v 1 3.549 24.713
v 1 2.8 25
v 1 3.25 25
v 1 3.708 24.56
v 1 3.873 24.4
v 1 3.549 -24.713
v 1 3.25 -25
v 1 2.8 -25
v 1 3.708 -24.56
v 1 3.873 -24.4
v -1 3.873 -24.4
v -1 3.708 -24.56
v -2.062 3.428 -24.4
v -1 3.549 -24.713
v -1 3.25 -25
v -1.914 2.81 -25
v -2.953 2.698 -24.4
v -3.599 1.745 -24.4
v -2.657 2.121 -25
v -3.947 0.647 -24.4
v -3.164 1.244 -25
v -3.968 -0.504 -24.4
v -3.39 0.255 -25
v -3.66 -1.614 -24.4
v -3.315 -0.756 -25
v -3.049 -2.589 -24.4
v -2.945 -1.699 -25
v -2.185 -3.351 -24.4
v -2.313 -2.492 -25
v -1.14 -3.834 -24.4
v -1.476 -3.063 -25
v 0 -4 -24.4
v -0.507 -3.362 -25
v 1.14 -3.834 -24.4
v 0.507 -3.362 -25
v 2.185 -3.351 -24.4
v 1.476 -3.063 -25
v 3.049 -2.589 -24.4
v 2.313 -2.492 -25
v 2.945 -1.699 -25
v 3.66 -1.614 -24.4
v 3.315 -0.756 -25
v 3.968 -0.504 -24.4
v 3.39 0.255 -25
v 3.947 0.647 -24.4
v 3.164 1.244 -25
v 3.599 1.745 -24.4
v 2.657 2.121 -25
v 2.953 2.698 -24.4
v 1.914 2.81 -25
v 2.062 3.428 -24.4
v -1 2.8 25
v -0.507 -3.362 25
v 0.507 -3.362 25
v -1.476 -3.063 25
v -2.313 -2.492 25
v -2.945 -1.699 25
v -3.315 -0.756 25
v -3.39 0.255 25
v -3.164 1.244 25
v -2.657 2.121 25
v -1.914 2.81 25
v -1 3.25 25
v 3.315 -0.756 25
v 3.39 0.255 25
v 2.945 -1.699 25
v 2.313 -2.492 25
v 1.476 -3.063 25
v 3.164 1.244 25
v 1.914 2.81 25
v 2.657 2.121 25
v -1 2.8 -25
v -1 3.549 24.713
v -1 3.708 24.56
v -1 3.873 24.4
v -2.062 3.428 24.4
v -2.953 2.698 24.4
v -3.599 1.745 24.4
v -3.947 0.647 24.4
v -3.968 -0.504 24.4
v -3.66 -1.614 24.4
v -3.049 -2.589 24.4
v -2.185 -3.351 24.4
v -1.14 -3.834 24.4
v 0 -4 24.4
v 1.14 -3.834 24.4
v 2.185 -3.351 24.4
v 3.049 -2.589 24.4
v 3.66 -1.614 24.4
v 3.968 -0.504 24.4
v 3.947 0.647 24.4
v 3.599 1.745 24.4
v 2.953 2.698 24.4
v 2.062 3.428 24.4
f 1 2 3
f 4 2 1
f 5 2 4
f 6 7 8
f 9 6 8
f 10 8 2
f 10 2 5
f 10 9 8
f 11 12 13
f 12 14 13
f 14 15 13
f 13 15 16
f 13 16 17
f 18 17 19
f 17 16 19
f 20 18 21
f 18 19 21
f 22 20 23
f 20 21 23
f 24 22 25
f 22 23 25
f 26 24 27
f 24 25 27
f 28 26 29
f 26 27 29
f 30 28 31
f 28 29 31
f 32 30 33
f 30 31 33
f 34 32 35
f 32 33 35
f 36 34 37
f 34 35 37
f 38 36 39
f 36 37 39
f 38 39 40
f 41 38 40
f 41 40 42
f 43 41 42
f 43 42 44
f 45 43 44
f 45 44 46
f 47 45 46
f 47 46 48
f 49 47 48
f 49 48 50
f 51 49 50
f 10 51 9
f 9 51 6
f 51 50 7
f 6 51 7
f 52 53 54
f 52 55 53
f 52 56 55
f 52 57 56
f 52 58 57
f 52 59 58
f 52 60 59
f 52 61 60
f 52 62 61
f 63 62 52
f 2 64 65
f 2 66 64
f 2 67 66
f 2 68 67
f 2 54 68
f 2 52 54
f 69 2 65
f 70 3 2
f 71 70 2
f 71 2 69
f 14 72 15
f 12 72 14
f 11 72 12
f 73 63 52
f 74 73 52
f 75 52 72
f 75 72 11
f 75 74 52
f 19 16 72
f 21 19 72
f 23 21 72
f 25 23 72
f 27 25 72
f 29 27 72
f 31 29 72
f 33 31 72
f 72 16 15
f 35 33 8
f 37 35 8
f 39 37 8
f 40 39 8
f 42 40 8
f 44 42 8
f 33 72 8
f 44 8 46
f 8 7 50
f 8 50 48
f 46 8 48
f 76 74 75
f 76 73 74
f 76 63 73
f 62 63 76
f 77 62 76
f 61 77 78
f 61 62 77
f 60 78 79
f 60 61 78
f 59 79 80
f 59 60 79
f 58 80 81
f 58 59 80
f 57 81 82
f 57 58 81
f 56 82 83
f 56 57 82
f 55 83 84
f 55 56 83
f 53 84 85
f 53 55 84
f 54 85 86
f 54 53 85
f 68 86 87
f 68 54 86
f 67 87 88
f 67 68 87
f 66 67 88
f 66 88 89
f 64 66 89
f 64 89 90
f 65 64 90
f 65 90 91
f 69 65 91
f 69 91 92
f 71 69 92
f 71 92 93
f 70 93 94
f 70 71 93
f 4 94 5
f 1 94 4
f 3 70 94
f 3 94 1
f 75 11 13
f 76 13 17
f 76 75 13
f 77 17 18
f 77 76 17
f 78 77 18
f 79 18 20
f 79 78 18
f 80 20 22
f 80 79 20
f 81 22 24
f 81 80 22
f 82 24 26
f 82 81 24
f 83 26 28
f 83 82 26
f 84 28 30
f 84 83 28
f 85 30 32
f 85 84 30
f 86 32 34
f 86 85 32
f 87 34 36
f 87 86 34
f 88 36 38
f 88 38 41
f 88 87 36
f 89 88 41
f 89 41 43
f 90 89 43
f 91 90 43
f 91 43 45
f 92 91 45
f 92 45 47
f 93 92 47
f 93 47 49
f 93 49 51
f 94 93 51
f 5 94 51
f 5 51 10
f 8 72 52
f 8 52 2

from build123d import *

# Parameters (mm, degrees)
SKETCH1_R           = 4
EXTRUDE1_DEPTH      = 25
CHAMFER1_SIZE       = 0.6
SKETCH3_W           = 2
SKETCH3_H           = 1.2
EXTRUDE2_DEPTH      = 26
EXTRUDE2_DEPTH_BACK = 26


with BuildPart() as part:
    # Sketch1 → Extrude1 (new body, symmetric)
    with BuildSketch(Plane.XY):
        Circle(SKETCH1_R)
    extrude(amount=EXTRUDE1_DEPTH, both=True)

    # Chamfer1
    chamfer1_edges = [part.edges().sort_by_distance(p)[0] for p in [
        (-4, 0, -25),
        (-4, 0, 25),
    ]]
    chamfer(chamfer1_edges, length=CHAMFER1_SIZE)

    # Sketch3 → Extrude2 (cut, two sides)
    with BuildSketch(Plane.XY) as extrude2_sk:
        with Locations((0, 3.4)):
            Rectangle(SKETCH3_W, SKETCH3_H)
    extrude(amount=EXTRUDE2_DEPTH, mode=Mode.SUBTRACT)
    extrude(extrude2_sk.sketch, amount=-EXTRUDE2_DEPTH_BACK, mode=Mode.SUBTRACT)


solid = part.part
